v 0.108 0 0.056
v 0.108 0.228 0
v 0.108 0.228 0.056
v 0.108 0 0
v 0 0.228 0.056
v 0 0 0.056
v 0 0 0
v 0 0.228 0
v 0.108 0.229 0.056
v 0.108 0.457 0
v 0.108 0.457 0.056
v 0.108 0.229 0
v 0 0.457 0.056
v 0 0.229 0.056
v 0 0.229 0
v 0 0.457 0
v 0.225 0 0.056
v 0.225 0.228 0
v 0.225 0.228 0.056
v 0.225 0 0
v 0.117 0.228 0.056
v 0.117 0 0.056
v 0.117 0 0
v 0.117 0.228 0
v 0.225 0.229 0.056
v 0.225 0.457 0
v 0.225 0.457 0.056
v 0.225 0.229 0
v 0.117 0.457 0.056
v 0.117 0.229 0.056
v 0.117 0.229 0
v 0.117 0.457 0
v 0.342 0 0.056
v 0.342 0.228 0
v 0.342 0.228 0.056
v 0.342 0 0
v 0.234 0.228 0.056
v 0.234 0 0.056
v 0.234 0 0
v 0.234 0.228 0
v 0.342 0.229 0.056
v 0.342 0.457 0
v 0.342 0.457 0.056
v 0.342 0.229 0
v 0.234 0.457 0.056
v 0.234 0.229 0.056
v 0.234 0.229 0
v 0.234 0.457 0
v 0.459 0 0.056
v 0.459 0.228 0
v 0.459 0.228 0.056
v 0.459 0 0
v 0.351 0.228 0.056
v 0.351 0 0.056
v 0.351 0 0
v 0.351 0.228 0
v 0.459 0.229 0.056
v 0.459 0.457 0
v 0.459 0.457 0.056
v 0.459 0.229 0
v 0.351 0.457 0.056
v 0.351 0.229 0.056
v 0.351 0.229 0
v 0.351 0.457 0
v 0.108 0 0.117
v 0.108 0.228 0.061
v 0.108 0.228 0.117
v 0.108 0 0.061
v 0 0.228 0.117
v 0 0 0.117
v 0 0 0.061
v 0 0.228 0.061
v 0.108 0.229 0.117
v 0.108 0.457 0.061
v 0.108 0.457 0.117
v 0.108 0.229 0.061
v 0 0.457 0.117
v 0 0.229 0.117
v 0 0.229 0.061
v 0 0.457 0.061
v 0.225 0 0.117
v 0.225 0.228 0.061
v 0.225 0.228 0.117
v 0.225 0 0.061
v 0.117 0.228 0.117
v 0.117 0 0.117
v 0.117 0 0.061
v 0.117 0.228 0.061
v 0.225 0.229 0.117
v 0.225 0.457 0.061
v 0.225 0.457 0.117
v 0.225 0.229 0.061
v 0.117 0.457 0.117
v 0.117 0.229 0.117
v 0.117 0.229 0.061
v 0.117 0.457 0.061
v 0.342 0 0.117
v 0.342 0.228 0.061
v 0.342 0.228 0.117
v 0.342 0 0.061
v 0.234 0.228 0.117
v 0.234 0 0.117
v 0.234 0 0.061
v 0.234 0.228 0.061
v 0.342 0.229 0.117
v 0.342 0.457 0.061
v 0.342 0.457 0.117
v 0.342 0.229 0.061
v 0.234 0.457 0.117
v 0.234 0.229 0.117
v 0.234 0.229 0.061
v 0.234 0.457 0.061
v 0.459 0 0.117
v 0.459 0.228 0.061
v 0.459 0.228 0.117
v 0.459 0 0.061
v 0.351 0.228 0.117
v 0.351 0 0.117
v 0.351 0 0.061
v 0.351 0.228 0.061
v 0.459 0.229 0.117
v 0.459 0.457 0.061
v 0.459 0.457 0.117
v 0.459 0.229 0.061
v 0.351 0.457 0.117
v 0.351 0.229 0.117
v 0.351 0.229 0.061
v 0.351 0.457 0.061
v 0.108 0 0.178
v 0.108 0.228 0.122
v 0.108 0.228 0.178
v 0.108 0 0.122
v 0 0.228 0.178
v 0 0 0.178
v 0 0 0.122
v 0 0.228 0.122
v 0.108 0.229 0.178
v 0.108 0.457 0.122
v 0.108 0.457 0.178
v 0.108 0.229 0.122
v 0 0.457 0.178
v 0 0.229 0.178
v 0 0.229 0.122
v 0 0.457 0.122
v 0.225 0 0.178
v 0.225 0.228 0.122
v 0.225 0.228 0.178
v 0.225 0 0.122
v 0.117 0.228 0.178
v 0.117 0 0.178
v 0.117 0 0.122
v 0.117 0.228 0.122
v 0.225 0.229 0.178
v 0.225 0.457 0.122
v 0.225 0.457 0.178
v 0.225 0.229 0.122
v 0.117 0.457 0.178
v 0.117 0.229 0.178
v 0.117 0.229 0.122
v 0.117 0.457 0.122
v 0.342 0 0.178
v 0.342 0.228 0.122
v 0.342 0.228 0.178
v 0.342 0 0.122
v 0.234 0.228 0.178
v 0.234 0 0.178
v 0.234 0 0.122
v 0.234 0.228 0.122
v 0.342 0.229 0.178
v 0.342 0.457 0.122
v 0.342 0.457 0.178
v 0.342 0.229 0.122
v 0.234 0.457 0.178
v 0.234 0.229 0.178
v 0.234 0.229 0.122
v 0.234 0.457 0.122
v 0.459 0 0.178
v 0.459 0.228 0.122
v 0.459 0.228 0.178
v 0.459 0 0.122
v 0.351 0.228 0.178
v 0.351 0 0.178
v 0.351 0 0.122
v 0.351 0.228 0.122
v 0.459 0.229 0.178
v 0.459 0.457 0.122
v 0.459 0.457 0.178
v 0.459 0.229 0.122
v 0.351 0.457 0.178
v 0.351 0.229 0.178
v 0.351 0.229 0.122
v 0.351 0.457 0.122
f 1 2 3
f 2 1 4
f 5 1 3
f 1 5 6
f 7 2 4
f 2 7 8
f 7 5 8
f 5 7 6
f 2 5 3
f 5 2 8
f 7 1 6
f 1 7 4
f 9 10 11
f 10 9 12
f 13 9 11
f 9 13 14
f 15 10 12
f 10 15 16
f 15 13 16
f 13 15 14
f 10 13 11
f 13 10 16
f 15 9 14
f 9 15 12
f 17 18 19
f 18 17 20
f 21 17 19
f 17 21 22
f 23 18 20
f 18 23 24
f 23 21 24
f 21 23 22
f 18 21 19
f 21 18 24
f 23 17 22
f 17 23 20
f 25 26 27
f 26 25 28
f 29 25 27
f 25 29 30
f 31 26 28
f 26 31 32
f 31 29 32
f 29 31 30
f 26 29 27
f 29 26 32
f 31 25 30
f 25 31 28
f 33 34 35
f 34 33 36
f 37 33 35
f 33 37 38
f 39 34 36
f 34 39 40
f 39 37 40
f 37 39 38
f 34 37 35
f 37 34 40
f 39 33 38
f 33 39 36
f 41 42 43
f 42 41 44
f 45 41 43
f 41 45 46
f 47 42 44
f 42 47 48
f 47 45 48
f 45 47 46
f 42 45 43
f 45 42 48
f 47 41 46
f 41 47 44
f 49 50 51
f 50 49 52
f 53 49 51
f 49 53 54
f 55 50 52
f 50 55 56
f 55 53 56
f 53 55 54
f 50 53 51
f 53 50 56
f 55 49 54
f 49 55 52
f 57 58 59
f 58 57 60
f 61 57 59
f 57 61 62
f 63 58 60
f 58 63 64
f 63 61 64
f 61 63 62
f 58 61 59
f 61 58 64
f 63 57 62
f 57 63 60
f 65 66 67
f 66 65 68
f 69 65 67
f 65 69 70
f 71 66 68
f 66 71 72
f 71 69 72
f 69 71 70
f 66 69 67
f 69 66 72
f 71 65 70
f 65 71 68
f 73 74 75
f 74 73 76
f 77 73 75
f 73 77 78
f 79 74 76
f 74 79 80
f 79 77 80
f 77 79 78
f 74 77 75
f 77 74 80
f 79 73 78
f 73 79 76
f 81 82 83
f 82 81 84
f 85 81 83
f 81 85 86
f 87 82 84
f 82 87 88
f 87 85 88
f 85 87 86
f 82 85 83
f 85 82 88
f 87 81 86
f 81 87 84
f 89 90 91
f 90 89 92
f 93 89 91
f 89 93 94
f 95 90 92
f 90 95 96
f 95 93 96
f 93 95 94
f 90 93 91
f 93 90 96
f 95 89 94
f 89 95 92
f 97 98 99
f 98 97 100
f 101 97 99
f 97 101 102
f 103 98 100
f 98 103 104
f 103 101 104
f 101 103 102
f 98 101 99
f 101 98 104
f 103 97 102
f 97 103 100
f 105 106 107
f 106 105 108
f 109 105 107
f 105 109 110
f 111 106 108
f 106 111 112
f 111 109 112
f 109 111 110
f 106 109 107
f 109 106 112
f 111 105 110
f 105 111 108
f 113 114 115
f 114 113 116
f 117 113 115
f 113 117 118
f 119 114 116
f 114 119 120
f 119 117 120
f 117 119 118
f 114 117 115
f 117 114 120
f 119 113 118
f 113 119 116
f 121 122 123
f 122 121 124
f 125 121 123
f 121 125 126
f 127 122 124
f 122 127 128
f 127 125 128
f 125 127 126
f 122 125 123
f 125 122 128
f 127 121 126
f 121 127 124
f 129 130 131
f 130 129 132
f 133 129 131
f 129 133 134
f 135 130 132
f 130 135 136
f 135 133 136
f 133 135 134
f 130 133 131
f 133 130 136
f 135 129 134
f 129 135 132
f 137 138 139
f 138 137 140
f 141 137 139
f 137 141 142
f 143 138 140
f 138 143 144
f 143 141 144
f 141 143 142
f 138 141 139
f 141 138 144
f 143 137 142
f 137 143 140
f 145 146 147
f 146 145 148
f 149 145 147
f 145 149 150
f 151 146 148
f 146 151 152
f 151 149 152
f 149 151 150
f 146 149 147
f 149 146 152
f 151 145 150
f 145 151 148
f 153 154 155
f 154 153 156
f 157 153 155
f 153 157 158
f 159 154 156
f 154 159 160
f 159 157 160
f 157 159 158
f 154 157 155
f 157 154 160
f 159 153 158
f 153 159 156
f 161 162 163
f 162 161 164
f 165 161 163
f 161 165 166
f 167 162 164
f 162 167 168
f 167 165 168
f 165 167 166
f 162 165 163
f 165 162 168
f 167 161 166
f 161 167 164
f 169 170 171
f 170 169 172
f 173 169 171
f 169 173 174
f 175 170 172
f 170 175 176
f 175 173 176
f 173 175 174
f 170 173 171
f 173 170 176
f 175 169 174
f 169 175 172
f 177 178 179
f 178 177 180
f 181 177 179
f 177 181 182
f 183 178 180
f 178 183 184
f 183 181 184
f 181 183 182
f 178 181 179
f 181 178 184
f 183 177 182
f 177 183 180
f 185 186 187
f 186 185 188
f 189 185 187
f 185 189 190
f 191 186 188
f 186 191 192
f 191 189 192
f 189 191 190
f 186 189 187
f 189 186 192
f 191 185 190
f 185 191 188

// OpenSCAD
// file: compose.scad
// constants
ob = [0.056, 0.108, 0.228]; // Size of ordinary brick
fb = [0.065, 0.125, 0.228]; // Size of firebrick
mt = 0.005; // The mortar thickness

module brick() {
    color("orange")
    cube([ob[1], ob[2], ob[0]]);
}

module layer(i) {
    translate([0, 0, i*(ob[0] + mt)]) children();
}

module full_layer(x, y) {
    for (xx=[0:x-1])
        for (yy=[0:y-1])
            translate([xx*(2*ob[0] + mt), yy*(4*ob[0] + mt), 0]) brick();
}
// main file
include <compose.scad>

layer(0) full_layer(4, 2);
layer(1) full_layer(4, 2);
layer(2) full_layer(4, 2);
